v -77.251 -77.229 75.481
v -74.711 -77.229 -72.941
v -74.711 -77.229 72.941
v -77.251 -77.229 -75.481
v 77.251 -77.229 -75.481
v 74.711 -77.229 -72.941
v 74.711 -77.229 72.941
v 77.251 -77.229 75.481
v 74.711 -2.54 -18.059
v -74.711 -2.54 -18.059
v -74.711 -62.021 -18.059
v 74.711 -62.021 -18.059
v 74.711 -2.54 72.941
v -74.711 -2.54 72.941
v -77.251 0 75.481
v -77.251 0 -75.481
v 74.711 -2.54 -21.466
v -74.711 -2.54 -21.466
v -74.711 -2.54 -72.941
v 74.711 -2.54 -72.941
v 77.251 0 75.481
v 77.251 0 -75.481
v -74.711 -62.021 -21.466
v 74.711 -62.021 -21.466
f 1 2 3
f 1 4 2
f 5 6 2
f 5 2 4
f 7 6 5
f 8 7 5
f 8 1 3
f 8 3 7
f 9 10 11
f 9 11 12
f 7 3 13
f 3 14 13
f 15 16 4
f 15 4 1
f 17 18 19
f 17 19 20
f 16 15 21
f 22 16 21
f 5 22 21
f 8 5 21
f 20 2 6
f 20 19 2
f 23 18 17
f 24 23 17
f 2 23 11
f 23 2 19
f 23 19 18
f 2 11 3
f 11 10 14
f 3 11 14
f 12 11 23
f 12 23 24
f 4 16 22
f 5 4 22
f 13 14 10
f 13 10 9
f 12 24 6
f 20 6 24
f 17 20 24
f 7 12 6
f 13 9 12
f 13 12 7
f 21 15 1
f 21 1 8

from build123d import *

# Parameters (mm, degrees)
F1_W     = 154.501944
F1_H     = 150.962084
F2_DEPTH = 77.229418
F3_T     = -2.54
F4_W     = 149.421944
F4_H     = 3.407732
F5_DEPTH = 59.480889


with BuildPart() as f2:
    # F1 (on face) → F2 (new body)
    with BuildSketch(Plane.XZ):
        Rectangle(F1_W, F1_H)
    extrude(amount=F2_DEPTH)

    # F3
    f3_openings = [f2.faces().sort_by_distance(p)[0] for p in [
        (0, -77.229418, 0),
    ]]
    offset(amount=F3_T, openings=f3_openings)

    # F4 (on face) → F5 (join)
    with BuildSketch(Plane.XZ.offset(2.54)):
        with Locations((0, -19.762568)):
            Rectangle(F4_W, F4_H)
    extrude(amount=F5_DEPTH)


solid = f2.part
